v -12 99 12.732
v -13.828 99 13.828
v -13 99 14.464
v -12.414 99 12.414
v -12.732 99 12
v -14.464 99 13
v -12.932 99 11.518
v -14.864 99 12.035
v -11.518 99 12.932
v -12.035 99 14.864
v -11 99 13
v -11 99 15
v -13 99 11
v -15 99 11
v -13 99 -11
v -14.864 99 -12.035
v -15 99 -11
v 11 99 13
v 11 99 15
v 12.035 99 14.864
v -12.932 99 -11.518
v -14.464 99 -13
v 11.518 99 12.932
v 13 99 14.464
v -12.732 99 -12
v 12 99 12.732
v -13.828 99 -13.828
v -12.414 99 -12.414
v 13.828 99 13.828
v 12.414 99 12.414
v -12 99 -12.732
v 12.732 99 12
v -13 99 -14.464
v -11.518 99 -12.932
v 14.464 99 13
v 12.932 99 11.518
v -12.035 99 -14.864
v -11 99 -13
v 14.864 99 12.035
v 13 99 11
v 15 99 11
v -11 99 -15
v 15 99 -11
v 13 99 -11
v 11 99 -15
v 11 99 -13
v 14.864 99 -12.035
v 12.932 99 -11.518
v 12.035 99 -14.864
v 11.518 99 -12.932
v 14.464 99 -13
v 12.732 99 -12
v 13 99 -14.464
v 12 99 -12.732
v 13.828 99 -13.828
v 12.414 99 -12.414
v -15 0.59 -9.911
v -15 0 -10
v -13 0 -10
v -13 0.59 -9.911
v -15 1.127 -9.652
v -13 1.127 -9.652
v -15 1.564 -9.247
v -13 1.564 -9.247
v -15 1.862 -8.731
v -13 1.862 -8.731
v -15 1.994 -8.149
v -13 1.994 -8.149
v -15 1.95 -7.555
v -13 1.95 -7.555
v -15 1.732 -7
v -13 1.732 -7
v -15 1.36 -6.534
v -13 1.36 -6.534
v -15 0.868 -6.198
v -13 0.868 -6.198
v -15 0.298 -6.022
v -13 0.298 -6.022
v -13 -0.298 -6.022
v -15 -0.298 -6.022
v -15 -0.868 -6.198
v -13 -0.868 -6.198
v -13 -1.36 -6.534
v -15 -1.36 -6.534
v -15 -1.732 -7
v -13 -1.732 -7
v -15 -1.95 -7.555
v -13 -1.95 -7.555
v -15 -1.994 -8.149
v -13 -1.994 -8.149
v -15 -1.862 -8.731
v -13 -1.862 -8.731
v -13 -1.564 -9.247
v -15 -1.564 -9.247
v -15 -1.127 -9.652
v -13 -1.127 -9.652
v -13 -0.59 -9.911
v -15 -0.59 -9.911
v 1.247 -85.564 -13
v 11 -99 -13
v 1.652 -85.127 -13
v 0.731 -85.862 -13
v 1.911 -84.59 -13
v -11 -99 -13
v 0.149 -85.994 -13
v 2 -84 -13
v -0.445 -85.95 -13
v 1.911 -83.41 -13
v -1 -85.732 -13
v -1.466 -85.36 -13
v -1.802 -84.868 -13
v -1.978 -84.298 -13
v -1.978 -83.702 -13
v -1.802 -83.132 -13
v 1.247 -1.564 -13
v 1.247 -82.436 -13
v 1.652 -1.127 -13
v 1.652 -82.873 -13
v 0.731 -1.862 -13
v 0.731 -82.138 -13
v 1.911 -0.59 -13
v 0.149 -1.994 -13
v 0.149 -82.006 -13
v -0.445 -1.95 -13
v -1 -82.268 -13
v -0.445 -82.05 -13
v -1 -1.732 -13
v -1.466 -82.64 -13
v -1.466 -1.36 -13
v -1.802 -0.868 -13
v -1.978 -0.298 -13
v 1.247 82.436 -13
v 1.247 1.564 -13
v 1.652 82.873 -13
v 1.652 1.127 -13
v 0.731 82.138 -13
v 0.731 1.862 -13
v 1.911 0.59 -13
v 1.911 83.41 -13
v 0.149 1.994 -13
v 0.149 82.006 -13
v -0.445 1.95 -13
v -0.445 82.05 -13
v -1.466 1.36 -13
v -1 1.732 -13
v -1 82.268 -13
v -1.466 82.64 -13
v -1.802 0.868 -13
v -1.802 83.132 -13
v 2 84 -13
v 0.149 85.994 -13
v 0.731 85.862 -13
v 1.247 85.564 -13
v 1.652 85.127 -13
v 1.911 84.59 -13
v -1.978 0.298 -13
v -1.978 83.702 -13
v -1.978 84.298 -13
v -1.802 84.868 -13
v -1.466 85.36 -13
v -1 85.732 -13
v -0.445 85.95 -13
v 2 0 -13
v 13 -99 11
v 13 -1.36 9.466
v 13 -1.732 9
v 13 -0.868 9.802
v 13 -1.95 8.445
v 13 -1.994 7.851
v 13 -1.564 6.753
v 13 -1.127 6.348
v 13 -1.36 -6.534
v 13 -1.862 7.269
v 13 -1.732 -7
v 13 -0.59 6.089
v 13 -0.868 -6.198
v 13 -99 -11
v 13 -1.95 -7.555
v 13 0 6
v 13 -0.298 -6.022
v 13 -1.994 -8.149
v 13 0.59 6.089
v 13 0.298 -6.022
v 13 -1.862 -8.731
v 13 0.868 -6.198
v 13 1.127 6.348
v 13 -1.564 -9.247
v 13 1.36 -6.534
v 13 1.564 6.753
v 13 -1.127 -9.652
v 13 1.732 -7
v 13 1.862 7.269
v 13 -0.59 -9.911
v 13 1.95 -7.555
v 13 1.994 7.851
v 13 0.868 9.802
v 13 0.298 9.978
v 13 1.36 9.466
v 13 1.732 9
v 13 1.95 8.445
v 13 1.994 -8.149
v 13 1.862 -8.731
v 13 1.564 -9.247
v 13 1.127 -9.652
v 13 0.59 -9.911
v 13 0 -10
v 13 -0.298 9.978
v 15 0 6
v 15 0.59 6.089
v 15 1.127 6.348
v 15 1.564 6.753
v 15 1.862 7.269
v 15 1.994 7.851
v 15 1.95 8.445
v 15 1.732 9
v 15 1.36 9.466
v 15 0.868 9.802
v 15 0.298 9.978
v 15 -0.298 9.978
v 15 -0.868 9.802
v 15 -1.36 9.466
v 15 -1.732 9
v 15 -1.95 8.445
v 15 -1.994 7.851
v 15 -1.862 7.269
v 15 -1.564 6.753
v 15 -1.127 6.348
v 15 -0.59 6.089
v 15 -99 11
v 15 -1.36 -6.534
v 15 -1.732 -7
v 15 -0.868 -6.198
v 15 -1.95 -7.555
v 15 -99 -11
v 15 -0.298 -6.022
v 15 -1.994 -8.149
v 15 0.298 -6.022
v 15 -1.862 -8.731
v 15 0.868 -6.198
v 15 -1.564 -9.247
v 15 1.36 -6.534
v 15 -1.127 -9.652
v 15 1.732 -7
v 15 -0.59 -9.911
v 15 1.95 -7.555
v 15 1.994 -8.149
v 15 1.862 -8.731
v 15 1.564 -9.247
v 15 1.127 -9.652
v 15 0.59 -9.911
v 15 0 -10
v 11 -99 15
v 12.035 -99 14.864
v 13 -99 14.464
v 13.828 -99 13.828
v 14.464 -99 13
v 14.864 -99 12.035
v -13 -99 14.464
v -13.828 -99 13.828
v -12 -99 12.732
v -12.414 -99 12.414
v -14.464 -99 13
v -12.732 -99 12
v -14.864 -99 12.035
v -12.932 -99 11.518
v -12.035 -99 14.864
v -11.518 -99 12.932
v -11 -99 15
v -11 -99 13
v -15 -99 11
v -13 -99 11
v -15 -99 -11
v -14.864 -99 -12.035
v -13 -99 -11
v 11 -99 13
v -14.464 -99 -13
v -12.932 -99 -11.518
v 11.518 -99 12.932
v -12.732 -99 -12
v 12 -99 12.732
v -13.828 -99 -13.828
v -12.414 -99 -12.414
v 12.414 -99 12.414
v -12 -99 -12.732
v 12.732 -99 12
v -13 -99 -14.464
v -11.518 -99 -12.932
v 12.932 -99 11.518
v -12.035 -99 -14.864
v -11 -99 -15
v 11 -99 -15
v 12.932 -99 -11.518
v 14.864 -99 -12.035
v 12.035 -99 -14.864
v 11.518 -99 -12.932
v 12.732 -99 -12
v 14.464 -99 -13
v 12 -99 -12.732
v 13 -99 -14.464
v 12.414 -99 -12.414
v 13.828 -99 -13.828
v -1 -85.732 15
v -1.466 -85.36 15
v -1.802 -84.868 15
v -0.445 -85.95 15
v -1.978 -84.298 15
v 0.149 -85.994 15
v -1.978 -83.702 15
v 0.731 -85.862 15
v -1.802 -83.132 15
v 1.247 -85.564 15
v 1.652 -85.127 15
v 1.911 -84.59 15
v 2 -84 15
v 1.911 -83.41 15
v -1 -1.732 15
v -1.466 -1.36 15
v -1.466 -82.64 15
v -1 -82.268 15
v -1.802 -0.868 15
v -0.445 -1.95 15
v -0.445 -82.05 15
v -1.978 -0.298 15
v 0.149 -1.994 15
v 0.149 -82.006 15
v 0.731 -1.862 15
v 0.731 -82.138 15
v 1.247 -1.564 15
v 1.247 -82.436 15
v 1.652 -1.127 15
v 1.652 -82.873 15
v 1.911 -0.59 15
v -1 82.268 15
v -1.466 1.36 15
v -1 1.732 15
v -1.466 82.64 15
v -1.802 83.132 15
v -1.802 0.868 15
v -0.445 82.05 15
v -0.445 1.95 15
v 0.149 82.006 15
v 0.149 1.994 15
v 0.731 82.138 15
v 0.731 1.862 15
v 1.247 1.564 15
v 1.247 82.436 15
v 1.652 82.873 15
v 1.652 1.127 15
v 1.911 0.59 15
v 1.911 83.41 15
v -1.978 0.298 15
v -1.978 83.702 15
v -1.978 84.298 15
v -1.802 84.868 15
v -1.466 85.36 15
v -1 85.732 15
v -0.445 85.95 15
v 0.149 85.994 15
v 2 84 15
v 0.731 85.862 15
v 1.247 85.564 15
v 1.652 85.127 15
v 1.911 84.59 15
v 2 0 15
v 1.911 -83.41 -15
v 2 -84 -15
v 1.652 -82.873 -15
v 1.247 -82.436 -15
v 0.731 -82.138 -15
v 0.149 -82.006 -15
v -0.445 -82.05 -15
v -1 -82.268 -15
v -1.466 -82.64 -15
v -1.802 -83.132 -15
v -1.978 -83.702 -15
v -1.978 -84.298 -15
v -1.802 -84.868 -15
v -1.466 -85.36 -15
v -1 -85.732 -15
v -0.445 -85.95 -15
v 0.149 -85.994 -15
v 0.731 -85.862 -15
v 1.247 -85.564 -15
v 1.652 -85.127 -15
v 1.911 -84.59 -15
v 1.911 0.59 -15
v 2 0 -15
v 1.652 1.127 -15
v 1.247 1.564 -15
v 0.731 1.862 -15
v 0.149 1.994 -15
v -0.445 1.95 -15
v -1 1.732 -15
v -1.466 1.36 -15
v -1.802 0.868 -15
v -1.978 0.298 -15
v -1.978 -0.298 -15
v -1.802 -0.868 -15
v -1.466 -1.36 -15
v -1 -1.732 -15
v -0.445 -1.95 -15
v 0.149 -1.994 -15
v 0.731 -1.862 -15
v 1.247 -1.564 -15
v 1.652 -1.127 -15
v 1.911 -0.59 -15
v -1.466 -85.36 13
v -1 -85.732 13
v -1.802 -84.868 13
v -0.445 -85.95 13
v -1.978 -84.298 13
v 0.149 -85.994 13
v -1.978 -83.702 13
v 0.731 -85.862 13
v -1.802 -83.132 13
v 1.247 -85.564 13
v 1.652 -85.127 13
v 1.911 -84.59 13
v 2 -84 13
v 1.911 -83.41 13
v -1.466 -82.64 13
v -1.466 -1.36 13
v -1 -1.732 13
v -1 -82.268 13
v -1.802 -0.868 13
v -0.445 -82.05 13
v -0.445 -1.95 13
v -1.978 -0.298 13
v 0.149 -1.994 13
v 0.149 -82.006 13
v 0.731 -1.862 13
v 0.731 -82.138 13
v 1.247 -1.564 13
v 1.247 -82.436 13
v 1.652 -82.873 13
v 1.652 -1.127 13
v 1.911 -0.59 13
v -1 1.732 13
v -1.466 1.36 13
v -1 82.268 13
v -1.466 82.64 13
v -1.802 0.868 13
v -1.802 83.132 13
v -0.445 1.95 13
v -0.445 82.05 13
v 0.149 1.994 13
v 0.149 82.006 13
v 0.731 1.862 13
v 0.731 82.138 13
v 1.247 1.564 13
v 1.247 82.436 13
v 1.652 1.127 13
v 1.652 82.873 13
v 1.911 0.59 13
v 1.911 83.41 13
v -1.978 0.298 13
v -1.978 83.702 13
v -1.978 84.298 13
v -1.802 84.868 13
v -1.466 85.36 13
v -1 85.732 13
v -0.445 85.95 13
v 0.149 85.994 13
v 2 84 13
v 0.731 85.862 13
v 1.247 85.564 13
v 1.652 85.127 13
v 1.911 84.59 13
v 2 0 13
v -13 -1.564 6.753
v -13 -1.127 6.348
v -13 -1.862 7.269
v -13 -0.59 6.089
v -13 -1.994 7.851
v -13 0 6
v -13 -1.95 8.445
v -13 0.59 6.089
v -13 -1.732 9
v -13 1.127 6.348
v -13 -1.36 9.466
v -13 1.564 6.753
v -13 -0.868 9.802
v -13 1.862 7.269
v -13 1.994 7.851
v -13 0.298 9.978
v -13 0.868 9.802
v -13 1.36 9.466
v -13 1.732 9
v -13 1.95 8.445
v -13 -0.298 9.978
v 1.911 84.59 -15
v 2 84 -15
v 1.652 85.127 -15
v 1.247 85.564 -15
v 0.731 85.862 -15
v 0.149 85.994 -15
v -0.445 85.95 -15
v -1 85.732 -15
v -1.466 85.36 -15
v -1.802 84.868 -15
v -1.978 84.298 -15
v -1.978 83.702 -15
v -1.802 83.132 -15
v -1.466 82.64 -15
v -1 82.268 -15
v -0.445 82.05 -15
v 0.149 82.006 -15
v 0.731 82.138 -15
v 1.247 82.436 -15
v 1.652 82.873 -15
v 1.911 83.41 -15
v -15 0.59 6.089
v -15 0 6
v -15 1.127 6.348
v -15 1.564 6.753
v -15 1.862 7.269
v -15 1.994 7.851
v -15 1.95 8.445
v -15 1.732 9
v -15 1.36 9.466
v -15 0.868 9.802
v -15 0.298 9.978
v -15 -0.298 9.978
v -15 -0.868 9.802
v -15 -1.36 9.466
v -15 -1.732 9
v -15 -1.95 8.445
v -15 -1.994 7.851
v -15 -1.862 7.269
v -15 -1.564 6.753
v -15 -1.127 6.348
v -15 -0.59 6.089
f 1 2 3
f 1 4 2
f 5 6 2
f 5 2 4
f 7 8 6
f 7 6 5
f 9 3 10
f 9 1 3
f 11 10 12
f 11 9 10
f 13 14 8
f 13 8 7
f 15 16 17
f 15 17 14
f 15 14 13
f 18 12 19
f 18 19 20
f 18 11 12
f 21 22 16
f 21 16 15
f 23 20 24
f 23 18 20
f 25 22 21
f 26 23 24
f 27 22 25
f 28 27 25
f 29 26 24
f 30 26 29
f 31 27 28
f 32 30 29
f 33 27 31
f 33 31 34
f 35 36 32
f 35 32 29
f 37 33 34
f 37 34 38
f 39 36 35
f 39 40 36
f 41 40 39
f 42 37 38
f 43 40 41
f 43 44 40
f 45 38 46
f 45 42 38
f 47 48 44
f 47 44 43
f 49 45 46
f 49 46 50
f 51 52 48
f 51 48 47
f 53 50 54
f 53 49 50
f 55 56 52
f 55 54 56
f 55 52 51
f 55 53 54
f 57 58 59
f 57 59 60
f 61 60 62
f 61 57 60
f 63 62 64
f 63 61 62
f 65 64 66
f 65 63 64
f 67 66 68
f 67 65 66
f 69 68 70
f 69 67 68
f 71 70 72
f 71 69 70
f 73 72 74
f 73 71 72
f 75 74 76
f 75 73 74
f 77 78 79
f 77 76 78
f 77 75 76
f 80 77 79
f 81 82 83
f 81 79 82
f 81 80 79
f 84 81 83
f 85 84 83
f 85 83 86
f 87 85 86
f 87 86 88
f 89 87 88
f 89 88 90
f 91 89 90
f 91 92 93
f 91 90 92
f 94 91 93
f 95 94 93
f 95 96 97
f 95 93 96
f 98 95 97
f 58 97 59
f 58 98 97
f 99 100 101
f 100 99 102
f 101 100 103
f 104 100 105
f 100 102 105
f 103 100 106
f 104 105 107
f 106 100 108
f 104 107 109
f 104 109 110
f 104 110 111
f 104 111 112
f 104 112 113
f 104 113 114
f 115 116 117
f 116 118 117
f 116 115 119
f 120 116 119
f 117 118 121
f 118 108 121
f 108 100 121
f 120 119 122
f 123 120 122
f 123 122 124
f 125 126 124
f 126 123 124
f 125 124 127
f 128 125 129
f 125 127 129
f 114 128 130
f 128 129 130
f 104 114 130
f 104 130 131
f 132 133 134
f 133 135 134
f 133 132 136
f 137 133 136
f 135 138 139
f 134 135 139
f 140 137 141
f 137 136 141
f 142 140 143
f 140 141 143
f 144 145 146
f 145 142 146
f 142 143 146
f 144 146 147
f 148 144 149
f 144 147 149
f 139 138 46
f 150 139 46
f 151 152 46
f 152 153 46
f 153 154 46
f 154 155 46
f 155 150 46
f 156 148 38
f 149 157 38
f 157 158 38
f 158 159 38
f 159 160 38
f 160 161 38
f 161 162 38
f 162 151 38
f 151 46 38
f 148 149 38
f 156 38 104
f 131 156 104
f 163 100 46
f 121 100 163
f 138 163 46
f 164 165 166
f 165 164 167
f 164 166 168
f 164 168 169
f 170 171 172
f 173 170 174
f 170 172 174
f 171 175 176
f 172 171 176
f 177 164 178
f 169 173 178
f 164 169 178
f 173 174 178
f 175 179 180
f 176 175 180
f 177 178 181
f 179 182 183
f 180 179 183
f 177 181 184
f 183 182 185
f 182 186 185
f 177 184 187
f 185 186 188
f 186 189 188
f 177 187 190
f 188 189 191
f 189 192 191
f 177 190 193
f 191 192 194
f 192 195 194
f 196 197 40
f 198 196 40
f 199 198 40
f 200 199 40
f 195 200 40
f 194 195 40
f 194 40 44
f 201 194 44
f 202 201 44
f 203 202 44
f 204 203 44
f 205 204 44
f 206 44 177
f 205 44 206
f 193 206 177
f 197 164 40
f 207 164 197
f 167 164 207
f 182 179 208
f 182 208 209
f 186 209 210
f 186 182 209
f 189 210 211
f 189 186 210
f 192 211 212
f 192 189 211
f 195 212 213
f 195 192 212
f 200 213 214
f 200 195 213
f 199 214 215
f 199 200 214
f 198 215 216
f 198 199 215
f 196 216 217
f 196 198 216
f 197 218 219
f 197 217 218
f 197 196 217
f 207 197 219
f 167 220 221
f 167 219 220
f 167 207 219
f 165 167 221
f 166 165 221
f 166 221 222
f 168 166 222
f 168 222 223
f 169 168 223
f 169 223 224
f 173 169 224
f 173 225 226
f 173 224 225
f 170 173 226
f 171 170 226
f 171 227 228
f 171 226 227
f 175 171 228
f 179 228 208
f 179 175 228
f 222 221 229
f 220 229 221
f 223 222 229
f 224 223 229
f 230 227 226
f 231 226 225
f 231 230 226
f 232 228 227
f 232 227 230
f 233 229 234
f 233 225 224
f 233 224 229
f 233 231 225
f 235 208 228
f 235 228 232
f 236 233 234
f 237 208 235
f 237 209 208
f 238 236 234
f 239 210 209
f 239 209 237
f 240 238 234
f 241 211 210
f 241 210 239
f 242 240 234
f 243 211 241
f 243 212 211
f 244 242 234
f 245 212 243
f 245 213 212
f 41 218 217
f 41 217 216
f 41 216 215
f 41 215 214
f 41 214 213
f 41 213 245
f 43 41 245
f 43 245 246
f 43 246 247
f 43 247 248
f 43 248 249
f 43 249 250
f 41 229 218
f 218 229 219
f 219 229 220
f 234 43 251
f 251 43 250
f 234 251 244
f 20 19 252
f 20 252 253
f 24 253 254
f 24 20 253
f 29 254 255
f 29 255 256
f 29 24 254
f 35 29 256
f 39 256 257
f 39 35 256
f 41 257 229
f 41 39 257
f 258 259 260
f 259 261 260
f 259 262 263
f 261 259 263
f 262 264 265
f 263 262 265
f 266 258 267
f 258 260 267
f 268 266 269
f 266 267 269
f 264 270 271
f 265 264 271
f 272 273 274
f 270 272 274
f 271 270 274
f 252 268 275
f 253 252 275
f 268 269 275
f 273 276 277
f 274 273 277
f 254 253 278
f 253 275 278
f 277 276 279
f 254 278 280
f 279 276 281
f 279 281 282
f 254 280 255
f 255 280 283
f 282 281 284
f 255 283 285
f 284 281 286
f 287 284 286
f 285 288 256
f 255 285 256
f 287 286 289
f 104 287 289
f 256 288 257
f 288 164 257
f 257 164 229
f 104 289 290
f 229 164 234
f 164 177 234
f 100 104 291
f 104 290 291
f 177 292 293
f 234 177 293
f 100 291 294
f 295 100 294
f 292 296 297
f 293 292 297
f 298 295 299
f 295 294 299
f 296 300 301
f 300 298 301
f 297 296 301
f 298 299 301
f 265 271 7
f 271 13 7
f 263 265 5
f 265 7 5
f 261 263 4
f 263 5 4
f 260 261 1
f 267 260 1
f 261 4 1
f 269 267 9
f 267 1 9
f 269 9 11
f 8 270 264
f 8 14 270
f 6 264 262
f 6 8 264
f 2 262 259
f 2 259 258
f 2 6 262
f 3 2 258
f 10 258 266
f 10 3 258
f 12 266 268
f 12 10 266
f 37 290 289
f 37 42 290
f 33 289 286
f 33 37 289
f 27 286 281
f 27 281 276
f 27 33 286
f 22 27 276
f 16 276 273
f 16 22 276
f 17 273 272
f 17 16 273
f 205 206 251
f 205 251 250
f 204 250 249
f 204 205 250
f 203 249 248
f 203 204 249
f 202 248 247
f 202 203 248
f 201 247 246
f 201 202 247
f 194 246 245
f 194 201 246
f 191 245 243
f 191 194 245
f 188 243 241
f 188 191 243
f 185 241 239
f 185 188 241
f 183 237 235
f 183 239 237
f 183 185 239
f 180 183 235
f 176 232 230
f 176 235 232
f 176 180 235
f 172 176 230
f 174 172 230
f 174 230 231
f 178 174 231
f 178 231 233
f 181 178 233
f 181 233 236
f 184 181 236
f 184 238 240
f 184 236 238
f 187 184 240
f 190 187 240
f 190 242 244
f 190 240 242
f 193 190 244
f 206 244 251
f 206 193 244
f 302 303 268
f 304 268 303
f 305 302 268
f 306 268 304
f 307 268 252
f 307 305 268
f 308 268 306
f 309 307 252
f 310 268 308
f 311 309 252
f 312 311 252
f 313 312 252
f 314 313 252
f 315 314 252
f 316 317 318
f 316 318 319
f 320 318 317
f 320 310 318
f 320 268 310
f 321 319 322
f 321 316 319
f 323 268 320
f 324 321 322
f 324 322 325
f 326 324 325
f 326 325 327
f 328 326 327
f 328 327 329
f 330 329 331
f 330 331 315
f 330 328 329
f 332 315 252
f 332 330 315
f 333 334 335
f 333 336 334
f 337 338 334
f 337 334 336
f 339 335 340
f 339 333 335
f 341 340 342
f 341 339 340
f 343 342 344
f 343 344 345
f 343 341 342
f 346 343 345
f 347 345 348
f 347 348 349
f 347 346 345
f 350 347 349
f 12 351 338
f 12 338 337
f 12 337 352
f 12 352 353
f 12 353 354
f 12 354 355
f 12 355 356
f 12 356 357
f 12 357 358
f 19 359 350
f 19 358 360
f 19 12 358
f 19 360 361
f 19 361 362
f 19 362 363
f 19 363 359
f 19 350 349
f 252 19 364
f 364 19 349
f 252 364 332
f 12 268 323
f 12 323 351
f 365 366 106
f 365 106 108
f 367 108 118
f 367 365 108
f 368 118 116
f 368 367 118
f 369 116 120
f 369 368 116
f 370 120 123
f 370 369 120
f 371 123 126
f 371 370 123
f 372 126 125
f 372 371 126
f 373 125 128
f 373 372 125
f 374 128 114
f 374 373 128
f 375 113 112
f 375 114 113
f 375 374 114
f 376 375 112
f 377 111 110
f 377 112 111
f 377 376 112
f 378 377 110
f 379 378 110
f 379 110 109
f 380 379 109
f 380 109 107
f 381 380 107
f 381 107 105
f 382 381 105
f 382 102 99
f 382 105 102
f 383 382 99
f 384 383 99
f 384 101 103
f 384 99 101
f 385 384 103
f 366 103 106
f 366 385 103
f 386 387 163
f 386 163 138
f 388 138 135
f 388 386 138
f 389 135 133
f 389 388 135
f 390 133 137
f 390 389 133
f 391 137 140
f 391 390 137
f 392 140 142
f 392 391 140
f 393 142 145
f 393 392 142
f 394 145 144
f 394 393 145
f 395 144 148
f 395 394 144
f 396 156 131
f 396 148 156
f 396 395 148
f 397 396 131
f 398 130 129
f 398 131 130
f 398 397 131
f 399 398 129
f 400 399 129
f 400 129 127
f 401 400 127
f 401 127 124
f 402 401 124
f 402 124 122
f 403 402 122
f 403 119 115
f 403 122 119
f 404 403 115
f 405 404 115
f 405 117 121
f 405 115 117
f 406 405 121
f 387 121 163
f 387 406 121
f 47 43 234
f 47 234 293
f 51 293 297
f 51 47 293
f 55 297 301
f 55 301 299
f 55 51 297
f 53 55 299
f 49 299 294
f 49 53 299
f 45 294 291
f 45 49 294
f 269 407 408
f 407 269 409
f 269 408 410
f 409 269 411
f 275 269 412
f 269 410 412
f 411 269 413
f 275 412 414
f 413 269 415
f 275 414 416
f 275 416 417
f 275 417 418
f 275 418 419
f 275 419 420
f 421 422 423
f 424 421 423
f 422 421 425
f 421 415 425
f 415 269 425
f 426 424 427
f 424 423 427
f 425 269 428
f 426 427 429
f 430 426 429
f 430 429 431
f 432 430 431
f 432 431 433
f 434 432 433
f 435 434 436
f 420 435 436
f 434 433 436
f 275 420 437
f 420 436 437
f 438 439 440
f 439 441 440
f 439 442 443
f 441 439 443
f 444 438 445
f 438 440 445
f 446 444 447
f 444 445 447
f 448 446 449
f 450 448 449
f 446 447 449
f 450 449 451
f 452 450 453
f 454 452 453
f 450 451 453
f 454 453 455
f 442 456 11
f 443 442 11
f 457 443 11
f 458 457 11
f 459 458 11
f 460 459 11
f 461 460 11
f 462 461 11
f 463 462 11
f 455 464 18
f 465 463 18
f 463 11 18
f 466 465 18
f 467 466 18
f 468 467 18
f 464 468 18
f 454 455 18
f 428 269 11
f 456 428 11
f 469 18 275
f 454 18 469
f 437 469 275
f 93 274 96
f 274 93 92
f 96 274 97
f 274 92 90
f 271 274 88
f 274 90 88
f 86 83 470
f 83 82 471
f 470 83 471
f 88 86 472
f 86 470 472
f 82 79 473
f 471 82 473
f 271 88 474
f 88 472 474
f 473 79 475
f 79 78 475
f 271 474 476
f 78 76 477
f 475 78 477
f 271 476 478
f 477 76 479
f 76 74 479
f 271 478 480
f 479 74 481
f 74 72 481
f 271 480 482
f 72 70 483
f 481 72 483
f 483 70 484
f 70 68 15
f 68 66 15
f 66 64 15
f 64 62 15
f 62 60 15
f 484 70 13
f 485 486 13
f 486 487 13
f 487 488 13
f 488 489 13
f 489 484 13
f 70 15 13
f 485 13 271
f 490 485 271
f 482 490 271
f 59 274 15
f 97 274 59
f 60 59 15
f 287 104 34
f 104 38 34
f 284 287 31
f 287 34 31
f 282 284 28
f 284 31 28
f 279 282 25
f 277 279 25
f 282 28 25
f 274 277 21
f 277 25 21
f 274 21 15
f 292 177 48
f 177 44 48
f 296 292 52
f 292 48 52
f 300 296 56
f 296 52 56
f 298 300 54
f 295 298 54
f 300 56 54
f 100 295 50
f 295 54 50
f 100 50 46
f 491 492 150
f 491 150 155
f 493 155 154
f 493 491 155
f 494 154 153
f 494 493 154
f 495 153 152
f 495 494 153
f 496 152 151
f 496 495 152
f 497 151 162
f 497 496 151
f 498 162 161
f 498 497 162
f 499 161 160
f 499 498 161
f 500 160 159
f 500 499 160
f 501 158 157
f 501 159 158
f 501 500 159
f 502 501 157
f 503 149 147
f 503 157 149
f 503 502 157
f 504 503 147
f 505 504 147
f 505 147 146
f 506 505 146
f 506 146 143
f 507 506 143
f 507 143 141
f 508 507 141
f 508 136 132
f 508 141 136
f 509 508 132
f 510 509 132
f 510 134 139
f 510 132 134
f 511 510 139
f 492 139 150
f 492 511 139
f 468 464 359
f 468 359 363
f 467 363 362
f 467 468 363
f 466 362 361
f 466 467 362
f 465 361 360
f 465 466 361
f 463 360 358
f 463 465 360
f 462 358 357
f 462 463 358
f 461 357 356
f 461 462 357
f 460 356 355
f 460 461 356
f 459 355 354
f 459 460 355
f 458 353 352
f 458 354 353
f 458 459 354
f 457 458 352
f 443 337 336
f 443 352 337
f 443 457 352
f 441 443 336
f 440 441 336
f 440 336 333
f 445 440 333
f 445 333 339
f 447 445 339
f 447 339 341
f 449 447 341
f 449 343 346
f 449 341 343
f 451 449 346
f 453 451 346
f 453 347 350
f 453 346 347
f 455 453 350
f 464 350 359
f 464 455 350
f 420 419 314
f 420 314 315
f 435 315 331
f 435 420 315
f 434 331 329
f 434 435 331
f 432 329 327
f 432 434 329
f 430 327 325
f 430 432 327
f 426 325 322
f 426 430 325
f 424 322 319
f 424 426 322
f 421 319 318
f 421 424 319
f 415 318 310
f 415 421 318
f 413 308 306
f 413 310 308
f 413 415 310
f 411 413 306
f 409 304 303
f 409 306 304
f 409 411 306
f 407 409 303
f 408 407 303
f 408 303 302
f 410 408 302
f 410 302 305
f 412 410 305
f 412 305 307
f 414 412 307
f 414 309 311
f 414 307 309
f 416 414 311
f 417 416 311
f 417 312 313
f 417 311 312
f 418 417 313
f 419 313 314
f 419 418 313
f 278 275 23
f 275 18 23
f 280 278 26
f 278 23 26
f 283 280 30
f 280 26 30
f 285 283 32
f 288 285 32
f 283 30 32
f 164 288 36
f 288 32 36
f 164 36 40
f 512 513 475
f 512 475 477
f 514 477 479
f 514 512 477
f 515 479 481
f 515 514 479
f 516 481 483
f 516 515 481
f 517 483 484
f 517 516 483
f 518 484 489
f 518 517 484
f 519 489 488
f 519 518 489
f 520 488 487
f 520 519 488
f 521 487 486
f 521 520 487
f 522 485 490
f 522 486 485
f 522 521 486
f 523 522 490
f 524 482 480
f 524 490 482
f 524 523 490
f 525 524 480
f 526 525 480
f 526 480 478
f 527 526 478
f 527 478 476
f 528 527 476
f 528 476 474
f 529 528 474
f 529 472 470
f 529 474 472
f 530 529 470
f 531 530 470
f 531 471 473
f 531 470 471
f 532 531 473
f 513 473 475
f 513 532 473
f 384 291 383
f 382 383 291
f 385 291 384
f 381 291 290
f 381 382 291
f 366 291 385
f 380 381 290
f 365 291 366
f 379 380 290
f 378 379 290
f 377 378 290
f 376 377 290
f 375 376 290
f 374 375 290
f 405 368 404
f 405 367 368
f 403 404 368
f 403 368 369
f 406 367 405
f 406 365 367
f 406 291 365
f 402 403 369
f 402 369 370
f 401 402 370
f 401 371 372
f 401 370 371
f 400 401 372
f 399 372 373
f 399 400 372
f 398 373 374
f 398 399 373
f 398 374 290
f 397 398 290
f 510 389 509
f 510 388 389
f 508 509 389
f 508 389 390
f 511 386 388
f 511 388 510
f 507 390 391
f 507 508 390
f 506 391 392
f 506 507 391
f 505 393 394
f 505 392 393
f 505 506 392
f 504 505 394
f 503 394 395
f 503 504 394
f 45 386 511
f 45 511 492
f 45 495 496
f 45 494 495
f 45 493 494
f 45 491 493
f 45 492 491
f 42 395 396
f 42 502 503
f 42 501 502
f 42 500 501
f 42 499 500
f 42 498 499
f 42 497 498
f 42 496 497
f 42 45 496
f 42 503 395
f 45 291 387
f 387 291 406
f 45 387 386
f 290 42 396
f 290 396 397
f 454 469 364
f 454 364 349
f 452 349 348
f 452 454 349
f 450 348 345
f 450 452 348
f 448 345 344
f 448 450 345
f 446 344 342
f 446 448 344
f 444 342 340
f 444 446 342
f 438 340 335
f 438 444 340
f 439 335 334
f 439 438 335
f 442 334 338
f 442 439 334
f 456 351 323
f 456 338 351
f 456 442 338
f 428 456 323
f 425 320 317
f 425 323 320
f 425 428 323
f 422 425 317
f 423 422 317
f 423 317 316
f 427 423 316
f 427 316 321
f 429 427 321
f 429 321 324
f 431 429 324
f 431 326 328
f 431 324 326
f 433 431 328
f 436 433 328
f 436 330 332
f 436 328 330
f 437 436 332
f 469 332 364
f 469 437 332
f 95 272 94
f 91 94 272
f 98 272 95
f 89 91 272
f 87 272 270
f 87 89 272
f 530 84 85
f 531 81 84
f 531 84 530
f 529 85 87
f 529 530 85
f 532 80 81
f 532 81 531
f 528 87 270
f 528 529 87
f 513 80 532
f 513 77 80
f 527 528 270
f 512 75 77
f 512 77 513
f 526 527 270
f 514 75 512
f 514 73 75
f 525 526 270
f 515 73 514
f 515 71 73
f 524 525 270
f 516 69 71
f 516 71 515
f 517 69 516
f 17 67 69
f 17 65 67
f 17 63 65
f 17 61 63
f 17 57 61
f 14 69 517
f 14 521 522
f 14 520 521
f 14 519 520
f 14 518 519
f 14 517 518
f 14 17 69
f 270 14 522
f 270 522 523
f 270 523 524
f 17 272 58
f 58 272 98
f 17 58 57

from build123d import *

# Parameters (mm, degrees)
EXTRUDE_1_DEPTH          = 99
CUT_EXTRUDE_1_DEPTH      = 102.247222184
CUT_EXTRUDE_1_DEPTH_BACK = 102.247222184
SKETCH_2_R               = 2
CUT_EXTRUDE_2_DEPTH      = 102.247222184
CUT_EXTRUDE_2_DEPTH_BACK = 102.247222184
SKETCH_3_R               = 2


with BuildPart() as part:
    # 草图1 → 凸台-拉伸1 (new, symmetric)
    with BuildSketch(Plane(origin=(0, 0, 0), x_dir=(1, 0, 0), z_dir=(0, 1, 0))):
        with BuildLine():
            Line((-11, -15), (11, -15))
            ThreePointArc((11, -15), (13.828427125, -13.828427125), (15, -11))
            Line((15, -11), (15, 11))
            ThreePointArc((15, 11), (13.828427125, 13.828427125), (11, 15))
            Line((11, 15), (-11, 15))
            ThreePointArc((-11, 15), (-13.828427125, 13.828427125), (-15, 11))
            Line((-15, 11), (-15, -11))
            ThreePointArc((-15, -11), (-13.828427125, -13.828427125), (-11, -15))
        make_face()
        with BuildLine():
            Line((-11, -13), (11, -13))
            ThreePointArc((11, -13), (12.414213562, -12.414213562), (13, -11))
            Line((13, -11), (13, 11))
            ThreePointArc((13, 11), (12.414213562, 12.414213562), (11, 13))
            Line((11, 13), (-11, 13))
            ThreePointArc((-11, 13), (-12.414213562, 12.414213562), (-13, 11))
            Line((-13, 11), (-13, -11))
            ThreePointArc((-13, -11), (-12.414213562, -12.414213562), (-11, -13))
        make_face(mode=Mode.SUBTRACT)
    extrude(amount=EXTRUDE_1_DEPTH, both=True)

    # 草图2 → 切除-拉伸1 (cut, two sides: drawn at the far end of the back side and taken through both)
    with BuildSketch(Plane(origin=(0, 0, 0), x_dir=(0, 0, -1), z_dir=(1, 0, 0)).offset(-CUT_EXTRUDE_1_DEPTH_BACK)):
        with Locations((8, 0)):
            Circle(SKETCH_2_R)
        with Locations((-8, 0)):
            Circle(SKETCH_2_R)
    extrude(amount=CUT_EXTRUDE_1_DEPTH + CUT_EXTRUDE_1_DEPTH_BACK, mode=Mode.SUBTRACT)

    # 草图3 → 切除-拉伸2 (cut, two sides: drawn at the far end of the back side and taken through both)
    with BuildSketch(Plane.XY.offset(-CUT_EXTRUDE_2_DEPTH_BACK)):
        with Locations((0, 84)):
            Circle(SKETCH_3_R)
        Circle(SKETCH_3_R)
        with Locations((0, -84)):
            Circle(SKETCH_3_R)
    extrude(amount=CUT_EXTRUDE_2_DEPTH + CUT_EXTRUDE_2_DEPTH_BACK, mode=Mode.SUBTRACT)


solid = part.part
